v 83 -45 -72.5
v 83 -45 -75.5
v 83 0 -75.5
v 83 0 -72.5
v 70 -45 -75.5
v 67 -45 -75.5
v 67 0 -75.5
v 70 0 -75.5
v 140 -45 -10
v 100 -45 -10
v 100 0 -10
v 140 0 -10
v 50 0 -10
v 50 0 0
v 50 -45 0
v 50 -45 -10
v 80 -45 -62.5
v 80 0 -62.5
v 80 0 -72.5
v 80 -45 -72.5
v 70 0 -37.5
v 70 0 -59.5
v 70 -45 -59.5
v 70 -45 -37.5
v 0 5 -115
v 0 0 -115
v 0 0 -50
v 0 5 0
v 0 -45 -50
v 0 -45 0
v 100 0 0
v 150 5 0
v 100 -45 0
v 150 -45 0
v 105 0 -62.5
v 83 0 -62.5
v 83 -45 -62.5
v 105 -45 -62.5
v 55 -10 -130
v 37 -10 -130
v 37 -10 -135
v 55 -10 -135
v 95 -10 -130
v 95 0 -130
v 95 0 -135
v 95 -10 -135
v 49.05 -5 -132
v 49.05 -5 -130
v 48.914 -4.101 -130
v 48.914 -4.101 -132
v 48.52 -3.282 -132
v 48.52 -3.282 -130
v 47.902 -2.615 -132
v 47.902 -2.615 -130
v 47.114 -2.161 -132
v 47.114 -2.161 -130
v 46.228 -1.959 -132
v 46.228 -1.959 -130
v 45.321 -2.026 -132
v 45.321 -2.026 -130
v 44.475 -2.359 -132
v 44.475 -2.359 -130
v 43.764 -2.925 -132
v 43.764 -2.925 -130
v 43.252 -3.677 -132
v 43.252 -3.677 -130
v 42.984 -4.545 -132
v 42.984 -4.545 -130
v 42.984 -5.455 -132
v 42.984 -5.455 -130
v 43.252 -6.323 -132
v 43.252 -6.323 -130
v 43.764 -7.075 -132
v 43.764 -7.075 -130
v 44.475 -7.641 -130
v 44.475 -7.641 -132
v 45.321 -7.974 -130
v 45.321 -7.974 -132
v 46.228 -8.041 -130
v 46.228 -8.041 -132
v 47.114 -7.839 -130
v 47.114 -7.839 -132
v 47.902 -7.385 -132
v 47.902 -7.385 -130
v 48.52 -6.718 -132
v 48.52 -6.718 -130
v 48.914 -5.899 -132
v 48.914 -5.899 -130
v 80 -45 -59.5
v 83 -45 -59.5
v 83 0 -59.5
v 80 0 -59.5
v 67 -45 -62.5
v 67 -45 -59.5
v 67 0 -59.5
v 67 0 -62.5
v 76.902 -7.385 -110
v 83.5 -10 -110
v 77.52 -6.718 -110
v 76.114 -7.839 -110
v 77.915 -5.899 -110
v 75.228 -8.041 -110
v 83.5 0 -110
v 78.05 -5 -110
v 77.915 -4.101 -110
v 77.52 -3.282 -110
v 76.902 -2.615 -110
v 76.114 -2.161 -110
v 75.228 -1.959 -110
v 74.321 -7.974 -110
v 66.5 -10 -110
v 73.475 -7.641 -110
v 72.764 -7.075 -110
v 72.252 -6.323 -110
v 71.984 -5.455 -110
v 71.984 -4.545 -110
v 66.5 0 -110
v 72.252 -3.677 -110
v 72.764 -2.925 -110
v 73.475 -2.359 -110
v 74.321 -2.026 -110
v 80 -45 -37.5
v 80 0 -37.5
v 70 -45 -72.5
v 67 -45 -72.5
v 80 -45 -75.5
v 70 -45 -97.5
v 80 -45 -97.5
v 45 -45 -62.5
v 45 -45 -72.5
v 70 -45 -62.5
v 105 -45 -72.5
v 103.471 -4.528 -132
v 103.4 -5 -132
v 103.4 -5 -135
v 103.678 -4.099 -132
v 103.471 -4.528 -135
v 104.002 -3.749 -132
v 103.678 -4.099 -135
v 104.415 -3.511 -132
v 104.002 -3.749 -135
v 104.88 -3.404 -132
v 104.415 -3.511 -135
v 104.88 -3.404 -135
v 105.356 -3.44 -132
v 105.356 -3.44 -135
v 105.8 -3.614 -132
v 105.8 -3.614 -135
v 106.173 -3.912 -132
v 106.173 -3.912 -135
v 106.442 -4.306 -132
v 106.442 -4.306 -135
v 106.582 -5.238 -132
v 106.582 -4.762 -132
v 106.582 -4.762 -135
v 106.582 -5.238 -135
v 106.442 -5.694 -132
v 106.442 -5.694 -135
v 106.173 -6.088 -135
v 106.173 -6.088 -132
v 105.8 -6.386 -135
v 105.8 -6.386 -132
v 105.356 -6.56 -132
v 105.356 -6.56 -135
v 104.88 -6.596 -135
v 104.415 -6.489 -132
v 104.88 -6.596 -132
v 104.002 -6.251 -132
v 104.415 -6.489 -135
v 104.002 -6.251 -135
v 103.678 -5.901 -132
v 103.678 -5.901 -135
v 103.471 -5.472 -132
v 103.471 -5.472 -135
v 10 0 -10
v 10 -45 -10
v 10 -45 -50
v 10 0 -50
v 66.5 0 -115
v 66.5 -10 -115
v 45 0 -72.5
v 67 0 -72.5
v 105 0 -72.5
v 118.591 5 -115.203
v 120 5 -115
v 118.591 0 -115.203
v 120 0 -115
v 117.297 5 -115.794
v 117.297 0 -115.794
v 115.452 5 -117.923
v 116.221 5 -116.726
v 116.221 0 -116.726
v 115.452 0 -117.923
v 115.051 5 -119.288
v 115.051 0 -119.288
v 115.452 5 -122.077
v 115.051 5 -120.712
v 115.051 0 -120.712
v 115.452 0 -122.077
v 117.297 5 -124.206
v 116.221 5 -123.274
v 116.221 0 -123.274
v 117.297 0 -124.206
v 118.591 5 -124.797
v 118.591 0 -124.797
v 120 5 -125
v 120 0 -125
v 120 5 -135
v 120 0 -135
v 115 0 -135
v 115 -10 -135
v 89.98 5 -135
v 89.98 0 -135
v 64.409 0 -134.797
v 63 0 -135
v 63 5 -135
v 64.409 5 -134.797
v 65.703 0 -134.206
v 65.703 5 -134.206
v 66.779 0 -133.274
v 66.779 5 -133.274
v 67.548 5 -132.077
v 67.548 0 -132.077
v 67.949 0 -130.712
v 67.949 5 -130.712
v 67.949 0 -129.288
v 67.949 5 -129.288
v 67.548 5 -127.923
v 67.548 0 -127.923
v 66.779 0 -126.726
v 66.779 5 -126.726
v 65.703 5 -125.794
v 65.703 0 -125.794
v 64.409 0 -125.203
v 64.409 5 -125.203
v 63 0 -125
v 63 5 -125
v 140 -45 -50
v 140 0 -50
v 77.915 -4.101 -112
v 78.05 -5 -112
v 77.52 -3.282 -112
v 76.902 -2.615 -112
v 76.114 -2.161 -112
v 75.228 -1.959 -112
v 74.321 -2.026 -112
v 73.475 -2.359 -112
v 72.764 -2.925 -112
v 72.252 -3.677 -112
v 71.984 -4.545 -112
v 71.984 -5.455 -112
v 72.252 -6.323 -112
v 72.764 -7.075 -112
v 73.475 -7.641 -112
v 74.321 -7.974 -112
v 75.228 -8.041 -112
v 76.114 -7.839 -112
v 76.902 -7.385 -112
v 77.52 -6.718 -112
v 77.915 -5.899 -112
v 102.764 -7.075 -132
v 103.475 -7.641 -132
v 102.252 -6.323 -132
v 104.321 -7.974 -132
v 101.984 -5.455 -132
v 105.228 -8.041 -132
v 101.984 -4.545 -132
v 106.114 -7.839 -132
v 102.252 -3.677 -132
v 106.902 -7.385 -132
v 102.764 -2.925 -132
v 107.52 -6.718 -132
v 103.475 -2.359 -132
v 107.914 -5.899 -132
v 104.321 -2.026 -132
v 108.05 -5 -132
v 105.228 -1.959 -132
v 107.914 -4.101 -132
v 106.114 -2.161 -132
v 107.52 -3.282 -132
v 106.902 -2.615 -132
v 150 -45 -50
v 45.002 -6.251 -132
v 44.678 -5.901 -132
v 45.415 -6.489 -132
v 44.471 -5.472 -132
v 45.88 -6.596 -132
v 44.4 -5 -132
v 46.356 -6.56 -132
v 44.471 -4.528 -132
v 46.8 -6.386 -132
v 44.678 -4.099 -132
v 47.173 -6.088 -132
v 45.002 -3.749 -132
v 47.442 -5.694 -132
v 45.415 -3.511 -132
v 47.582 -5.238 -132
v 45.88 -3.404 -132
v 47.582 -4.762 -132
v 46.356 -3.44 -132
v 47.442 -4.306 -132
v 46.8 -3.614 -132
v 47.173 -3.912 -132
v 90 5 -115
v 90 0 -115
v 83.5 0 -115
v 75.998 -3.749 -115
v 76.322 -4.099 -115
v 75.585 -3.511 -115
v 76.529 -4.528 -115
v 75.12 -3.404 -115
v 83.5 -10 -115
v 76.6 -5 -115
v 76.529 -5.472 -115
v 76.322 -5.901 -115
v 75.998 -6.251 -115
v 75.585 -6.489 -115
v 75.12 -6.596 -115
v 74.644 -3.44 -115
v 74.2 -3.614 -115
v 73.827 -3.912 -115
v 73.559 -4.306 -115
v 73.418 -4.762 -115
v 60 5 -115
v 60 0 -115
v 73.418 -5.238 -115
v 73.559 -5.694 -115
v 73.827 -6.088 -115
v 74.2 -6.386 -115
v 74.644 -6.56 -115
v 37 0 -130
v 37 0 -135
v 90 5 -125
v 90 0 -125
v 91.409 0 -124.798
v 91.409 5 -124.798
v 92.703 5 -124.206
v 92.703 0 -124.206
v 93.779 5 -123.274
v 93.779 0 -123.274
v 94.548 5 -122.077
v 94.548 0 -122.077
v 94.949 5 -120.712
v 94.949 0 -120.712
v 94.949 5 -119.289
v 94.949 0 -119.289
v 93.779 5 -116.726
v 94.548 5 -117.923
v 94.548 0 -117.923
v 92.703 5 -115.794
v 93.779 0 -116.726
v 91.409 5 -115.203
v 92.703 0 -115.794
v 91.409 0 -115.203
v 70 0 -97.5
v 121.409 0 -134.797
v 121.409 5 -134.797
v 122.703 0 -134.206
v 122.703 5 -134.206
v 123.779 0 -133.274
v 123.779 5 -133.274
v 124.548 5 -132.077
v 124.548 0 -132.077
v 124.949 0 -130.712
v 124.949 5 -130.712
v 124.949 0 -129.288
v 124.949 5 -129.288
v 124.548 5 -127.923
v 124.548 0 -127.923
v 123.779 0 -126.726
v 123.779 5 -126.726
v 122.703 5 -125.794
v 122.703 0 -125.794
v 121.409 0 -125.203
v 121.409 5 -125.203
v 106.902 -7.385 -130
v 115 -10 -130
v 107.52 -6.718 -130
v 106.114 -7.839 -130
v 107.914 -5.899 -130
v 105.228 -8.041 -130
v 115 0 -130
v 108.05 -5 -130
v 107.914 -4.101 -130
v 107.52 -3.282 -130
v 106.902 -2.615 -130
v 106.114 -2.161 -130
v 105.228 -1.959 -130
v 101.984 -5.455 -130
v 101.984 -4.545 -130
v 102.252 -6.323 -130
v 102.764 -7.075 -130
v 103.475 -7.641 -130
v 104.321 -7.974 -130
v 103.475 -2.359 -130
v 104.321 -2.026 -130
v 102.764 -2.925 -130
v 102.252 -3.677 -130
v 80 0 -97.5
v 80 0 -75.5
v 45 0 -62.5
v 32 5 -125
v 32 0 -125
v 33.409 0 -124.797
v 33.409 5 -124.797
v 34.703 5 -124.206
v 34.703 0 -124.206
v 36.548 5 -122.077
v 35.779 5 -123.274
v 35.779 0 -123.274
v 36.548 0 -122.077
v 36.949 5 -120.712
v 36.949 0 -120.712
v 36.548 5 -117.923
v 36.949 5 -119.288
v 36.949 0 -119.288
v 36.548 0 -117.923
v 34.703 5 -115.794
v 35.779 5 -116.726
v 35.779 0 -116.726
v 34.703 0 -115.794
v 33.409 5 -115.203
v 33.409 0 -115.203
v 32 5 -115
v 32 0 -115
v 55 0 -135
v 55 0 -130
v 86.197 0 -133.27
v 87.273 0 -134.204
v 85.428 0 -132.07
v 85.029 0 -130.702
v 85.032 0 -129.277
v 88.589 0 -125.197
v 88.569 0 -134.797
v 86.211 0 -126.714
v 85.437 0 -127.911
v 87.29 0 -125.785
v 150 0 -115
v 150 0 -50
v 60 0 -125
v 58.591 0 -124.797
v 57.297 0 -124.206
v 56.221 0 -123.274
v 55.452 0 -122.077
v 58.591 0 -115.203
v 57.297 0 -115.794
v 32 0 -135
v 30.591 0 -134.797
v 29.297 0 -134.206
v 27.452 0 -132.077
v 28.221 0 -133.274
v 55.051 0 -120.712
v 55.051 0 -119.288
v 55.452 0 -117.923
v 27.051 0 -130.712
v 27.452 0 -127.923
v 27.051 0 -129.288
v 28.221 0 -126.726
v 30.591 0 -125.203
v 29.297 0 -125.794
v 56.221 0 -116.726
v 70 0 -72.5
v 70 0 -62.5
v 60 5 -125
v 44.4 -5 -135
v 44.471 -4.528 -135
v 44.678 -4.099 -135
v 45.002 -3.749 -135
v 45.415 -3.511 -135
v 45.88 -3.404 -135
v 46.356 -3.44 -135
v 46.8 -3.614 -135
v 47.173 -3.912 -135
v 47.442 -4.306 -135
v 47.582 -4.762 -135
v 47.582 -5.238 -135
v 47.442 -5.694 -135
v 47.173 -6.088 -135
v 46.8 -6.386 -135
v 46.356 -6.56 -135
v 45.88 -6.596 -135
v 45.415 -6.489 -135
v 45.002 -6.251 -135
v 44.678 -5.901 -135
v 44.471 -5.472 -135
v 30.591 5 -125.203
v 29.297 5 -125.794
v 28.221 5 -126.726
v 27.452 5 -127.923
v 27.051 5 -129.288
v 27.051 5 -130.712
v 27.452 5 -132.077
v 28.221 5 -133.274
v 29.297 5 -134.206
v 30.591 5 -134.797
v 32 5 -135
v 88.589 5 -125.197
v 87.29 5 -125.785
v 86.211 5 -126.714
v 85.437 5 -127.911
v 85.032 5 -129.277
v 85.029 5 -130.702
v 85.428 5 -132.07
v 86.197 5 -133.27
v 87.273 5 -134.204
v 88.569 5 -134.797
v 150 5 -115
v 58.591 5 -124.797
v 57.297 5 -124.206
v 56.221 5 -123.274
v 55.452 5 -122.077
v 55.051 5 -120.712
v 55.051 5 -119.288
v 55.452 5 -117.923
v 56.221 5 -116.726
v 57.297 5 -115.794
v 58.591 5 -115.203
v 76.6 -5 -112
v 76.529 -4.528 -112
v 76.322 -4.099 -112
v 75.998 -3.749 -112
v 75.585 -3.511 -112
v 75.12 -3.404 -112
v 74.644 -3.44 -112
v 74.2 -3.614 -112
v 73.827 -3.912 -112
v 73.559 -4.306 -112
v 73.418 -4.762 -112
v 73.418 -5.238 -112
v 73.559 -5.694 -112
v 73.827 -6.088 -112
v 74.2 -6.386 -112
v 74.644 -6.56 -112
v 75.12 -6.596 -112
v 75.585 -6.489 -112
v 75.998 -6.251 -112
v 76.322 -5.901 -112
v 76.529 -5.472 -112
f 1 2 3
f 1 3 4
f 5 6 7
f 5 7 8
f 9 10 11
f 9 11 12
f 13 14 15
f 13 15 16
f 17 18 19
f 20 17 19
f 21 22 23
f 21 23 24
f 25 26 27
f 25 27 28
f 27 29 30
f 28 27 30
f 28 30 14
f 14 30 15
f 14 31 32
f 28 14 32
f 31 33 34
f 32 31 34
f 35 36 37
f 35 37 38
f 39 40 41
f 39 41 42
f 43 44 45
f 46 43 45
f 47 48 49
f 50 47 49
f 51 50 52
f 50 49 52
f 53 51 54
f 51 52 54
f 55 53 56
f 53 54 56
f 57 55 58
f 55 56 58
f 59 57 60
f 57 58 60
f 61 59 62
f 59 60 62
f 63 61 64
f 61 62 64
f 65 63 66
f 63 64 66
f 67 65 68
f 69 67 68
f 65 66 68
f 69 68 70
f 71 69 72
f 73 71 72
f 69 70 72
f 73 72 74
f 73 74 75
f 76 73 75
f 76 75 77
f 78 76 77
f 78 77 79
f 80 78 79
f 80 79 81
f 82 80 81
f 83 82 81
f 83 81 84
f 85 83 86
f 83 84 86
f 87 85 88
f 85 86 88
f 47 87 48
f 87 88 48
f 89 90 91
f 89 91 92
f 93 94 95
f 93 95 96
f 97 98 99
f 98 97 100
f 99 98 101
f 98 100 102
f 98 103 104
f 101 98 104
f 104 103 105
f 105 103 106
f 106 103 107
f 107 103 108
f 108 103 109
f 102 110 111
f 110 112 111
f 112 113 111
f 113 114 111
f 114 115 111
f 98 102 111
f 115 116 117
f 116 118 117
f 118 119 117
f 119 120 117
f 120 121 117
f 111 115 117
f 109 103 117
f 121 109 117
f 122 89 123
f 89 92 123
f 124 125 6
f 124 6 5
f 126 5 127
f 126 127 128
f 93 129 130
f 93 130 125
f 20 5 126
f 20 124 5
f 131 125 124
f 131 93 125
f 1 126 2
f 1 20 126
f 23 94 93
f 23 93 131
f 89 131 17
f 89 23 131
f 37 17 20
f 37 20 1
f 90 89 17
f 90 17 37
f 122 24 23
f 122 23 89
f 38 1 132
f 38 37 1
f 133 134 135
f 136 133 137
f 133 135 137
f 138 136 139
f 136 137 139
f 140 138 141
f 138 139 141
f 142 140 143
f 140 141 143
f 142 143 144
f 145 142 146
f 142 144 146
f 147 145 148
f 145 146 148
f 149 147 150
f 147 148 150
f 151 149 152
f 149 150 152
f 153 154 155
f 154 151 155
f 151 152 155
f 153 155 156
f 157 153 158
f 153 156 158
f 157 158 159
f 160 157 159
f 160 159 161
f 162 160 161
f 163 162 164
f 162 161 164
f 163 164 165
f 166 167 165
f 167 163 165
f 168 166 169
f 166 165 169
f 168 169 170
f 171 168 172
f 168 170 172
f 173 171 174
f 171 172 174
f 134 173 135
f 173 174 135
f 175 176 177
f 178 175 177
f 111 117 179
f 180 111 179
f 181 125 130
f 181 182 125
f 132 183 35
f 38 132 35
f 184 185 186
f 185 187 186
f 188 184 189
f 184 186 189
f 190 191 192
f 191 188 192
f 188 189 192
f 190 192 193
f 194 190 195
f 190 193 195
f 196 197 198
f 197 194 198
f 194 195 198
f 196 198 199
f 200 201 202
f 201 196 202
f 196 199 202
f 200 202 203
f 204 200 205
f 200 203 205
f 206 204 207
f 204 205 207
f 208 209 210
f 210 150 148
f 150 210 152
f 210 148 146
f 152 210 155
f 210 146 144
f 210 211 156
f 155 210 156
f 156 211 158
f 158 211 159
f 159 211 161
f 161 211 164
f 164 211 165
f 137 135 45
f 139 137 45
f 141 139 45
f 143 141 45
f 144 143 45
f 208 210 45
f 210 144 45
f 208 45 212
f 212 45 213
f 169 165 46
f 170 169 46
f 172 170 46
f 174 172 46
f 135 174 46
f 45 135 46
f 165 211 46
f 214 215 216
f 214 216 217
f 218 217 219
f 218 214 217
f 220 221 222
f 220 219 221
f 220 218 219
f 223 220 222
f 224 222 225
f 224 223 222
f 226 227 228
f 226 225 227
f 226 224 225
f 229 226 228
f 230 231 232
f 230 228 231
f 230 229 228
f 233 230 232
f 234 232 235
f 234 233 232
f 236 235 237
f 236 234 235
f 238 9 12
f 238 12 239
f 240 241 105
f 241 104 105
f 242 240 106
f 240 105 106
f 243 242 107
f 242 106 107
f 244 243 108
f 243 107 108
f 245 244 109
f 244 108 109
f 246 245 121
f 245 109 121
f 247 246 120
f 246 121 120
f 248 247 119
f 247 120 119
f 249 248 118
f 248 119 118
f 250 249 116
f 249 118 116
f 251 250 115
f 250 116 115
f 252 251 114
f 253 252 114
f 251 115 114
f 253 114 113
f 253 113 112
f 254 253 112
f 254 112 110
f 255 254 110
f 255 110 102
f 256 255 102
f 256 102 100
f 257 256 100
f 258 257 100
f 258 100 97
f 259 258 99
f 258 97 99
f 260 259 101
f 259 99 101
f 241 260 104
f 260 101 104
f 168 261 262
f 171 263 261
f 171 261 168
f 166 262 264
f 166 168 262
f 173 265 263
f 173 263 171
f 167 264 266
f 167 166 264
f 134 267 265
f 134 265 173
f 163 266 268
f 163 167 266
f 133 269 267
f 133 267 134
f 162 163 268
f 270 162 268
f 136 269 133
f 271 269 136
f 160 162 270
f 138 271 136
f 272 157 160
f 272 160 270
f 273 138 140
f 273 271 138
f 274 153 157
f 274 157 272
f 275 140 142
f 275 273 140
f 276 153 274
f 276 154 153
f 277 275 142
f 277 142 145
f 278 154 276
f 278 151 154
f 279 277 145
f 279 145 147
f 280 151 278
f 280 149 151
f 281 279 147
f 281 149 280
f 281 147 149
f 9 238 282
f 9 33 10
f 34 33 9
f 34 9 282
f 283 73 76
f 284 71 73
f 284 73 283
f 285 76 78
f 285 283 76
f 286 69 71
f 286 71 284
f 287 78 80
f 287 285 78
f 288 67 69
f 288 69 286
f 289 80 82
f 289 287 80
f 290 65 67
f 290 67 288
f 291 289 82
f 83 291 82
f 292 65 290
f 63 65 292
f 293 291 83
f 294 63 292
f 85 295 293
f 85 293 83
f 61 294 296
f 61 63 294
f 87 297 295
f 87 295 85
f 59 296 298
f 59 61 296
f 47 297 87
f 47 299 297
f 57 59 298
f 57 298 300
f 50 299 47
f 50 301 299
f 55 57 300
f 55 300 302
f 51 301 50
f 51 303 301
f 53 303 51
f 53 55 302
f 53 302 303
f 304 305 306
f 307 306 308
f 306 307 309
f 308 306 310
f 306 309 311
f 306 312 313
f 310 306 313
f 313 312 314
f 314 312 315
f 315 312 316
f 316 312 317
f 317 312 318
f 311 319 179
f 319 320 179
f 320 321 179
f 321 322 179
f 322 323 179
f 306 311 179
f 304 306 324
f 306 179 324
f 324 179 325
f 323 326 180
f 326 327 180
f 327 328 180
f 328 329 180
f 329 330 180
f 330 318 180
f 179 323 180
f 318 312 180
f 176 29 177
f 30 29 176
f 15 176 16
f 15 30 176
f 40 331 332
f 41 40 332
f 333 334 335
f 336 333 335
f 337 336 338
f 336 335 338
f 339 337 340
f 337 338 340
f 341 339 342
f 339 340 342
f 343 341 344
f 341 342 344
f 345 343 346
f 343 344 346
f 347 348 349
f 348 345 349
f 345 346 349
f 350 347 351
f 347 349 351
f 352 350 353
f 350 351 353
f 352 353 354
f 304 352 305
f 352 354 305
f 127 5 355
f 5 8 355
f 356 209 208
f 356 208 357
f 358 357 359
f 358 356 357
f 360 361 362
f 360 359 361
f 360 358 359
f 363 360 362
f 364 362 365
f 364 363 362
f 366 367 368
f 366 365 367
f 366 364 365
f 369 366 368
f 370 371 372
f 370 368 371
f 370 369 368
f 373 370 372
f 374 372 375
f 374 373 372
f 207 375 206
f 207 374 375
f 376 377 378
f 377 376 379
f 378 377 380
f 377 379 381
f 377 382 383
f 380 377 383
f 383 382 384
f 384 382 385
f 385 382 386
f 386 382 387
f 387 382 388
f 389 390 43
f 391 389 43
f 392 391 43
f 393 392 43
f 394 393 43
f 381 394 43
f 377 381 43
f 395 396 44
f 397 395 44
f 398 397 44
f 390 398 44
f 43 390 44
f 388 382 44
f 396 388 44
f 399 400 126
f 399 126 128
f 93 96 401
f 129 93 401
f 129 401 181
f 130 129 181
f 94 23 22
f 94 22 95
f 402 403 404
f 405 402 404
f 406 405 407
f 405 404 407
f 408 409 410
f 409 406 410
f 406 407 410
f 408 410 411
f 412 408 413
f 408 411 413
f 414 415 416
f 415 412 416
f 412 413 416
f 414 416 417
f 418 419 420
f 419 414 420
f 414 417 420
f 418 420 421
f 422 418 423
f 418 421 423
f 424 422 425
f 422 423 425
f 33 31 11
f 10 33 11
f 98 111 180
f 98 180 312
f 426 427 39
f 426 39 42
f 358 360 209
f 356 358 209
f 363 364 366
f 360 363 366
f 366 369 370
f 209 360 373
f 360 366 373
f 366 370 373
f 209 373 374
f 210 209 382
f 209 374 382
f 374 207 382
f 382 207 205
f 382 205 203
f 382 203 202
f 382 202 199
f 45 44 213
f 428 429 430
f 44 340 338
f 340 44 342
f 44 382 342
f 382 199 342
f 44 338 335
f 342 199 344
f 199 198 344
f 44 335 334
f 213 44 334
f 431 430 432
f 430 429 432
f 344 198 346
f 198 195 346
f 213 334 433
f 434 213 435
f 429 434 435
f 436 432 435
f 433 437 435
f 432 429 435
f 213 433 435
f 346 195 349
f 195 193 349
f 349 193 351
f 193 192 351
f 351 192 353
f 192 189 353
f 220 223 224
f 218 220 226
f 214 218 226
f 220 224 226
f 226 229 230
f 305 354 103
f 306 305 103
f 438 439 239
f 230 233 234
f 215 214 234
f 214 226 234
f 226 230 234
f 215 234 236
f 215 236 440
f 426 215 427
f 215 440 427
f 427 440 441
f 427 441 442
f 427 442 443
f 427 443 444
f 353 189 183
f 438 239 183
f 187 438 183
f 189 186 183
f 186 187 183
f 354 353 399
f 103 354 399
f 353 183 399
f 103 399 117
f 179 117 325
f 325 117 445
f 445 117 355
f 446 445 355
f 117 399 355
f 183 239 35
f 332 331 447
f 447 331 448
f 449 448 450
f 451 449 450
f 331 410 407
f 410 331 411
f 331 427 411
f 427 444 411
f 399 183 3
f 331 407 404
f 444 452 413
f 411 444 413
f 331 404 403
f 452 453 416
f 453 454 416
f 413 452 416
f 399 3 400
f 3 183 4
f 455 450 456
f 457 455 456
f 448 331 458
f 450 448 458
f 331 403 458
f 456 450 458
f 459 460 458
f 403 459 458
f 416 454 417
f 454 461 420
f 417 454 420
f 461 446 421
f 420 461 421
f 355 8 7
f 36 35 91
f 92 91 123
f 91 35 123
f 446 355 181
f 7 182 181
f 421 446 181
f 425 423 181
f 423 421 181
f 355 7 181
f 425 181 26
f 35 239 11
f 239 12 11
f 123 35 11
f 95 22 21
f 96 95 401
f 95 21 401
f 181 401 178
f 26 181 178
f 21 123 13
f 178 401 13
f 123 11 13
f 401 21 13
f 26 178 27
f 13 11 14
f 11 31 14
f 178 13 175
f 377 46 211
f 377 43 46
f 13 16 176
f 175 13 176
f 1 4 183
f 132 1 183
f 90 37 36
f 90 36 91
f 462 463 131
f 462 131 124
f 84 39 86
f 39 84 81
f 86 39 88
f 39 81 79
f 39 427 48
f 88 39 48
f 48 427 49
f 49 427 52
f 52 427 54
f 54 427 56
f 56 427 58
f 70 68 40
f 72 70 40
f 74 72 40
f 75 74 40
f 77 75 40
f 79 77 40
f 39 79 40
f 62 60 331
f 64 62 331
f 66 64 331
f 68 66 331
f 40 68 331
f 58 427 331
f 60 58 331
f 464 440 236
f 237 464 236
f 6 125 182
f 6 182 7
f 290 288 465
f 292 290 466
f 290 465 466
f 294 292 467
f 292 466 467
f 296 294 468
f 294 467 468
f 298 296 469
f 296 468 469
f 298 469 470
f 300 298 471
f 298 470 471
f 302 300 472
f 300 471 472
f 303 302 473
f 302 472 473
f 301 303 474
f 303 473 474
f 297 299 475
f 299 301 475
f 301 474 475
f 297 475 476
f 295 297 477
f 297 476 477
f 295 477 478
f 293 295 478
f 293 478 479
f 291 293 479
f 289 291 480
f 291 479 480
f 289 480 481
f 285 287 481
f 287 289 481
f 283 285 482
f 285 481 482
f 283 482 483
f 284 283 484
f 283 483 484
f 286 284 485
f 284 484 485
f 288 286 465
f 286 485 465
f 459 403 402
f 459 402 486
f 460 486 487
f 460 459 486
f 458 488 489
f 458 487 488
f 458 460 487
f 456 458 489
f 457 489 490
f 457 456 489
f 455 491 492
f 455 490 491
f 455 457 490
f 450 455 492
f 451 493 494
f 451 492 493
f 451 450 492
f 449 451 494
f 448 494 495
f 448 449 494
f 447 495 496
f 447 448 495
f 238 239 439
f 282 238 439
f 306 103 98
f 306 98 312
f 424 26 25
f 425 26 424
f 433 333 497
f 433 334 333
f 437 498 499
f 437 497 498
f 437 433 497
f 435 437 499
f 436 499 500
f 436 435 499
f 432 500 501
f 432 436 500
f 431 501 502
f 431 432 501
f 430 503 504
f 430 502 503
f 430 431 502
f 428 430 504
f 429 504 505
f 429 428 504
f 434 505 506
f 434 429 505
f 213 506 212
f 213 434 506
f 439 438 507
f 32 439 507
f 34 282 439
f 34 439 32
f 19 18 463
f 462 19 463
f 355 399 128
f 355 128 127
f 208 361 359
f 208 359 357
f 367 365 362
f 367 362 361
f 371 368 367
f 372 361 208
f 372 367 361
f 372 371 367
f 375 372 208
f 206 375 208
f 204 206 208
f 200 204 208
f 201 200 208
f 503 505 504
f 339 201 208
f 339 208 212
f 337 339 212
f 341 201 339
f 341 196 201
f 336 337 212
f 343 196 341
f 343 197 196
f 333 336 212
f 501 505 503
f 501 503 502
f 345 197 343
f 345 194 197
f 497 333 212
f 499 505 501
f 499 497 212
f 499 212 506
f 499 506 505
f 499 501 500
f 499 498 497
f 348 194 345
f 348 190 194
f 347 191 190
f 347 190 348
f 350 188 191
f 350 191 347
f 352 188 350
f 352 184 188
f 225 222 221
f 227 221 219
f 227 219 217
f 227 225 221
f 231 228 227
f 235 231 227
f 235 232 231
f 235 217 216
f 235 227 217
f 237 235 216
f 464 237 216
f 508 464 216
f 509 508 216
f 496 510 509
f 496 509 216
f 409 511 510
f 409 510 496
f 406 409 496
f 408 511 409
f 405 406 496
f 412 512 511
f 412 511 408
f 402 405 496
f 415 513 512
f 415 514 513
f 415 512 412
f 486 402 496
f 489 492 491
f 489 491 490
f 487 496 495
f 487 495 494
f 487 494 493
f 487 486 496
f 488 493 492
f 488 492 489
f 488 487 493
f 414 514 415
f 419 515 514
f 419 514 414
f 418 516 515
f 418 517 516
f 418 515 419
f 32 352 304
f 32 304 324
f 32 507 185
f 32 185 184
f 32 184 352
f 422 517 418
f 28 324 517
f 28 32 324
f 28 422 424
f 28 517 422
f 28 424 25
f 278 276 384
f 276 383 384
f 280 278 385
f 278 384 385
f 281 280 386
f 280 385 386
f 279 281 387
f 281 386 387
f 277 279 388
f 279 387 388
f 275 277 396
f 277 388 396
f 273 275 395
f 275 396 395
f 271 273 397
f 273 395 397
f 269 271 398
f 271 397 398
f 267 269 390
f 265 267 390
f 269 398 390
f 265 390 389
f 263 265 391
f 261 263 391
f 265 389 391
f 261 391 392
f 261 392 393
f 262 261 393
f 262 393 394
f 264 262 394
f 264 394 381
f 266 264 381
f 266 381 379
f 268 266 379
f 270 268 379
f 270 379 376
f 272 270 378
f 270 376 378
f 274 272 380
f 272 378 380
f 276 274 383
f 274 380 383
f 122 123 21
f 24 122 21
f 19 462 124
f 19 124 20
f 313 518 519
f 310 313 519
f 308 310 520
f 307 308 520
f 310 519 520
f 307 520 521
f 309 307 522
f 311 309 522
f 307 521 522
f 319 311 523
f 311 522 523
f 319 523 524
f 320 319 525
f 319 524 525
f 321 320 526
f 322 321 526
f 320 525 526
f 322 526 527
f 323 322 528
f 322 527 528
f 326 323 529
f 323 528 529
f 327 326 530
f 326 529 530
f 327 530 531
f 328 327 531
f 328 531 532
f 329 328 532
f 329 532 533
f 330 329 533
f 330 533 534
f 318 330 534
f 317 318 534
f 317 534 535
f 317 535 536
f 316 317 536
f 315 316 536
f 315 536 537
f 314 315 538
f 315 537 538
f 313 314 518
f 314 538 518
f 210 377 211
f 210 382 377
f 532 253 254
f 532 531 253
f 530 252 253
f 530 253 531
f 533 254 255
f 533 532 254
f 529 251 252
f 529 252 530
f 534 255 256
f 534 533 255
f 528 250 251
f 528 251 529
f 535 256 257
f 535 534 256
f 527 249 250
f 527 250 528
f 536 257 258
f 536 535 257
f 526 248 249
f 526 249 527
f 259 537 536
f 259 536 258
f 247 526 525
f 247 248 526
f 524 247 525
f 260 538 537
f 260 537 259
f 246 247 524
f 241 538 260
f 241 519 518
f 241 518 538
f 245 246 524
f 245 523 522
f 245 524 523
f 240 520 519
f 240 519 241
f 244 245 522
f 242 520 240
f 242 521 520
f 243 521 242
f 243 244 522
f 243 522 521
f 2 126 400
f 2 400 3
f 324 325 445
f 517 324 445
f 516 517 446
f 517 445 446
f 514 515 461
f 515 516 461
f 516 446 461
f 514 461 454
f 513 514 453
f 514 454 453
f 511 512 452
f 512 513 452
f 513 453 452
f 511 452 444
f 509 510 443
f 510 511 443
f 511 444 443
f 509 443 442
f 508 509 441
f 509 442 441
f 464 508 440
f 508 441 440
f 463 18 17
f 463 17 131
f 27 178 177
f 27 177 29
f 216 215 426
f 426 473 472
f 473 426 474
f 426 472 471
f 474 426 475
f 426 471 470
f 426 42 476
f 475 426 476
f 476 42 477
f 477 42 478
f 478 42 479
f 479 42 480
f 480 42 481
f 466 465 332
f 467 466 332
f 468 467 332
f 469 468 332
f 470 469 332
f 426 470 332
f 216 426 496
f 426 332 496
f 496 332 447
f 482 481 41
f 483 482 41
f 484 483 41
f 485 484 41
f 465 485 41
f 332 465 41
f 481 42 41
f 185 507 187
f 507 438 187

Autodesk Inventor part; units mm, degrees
ref_plane "YZ Plane" through (0, 0, 0) normal (1, 0, 0) x (0, 1, 0)
ref_plane "XZ Plane" through (0, 0, 0) normal (0, 1, 0) x (-1, 0, 0)
ref_plane "XY Plane" through (0, 0, 0) normal (0, 0, 1) x (1, 0, 0)
sketch "puzzle" plane through (0, 0, 0) normal (0, 1, 0) x (-1, 0, 0)
  line L0 (0, 0) -> (-150, 0)
  line L1 (0, -115) -> (-15, -115)
  line L2 (-135, -115) -> (-125, -115)
  line L3 (-135, -115) -> (-150, -115)
  line L4 (-75, -115) -> (-65, -115)
  line L5 (-75, -115) -> (-85.0002, -115)
  line L6 (-105, -135) -> (-94.9796, -135)
  line L7 (-94.9796, -135) -> (-115, -135)
  line L8 (-65, -115) -> (-60, -115)
  line L9 (-60, -125) -> (-63, -125)
  arc A0 (-60, -125) -> (-60, -115) centre (-60, -120) ccw
  arc A1 (-63, -125) -> (-63, -135) centre (-63, -130) ccw
  line L10 (-85.0002, -115) -> (-90.0002, -115)
  line L11 (-94.9796, -135) -> (-89.9796, -135)
  arc A2 (-90.0002, -115) -> (-90, -125) centre (-90.0002, -120) ccw
  arc A3 (-89.9796, -135) -> (-90, -125) centre (-89.9796, -130) ccw
  line L12 (-115, -135) -> (-120, -135)
  line L13 (-125, -115) -> (-120, -115)
  arc A4 (-120, -125) -> (-120, -115) centre (-120, -120) ccw
  arc A5 (-120, -125) -> (-120, -135) centre (-120, -130) ccw
  line L14 (0, -115) -> (-30, -115)
  line L15 (-63, -135) -> (-32.98, -135)
  line L16 (-32.98, -135) -> (-32, -135)
  line L17 (-30, -115) -> (-32, -115)
  arc A6 (-32, -115) -> (-32, -125) centre (-32, -120) ccw
  arc A7 (-32, -135) -> (-32, -125) centre (-32, -130) ccw
  line L18 (-150, -115) -> (-150, 0)
  line L19 (0, -115) -> (0, 0)
  dimension "d22" = 5
  dimension "d23" = 5
  dimension "d24" = 5
  dimension "d25" = 5
  dimension "d26" = 5
extrude "Extrusión1" add sketch "puzzle" along normal blind 5
sketch "peus" plane through (0, 0, 0) normal (0, -1, 0) x (1, 0, 0)
  line L0 (150, 0) -> (145, 0)
  line L1 (150, 0) -> (100, 0)
  line L2 (0, -115) -> (0, 0) projected
  line L3 (0, 0) -> (50, 0)
  line L4 (50, 0) -> (50, -10)
  line L5 (0, 0) -> (10, 0)
  line L6 (10, -50) -> (0, -50)
  line L7 (0, -50) -> (0, 0)
  line L8 (50, -10) -> (10, -10)
  line L9 (10, -10) -> (10, -50)
  line L10 (100, 0) -> (100, -10)
  line L11 (100, -10) -> (140, -10)
  line L12 (140, -10) -> (140, -50)
  line L13 (140, -50) -> (150, -50)
  line L14 (150, 0) -> (150, -115) projected
  line L15 (150, 0) -> (150, -50)
  line L16 (0, 0) -> (150, 0) projected
  line L17 (45, -62.5) -> (45, -72.5)
  line L18 (105, -72.5) -> (105, -62.5)
  line L19 (80, -97.5) -> (70, -97.5)
  line L20 (80, -37.5) -> (70, -37.5)
  line L21 (80, -62.5) -> (70, -62.5)
  line L22 (70, -62.5) -> (70, -72.5)
  line L23 (70, -72.5) -> (80, -72.5)
  line L24 (80, -62.5) -> (80, -72.5)
  line L25 (83, -62.5) -> (83, -59.5)
  line L26 (83, -59.5) -> (80, -59.5)
  line L27 (70, -59.5) -> (67, -59.5)
  line L28 (67, -59.5) -> (67, -62.5)
  line L29 (67, -72.5) -> (67, -75.5)
  line L30 (67, -75.5) -> (70, -75.5)
  line L31 (80, -75.5) -> (83, -75.5)
  line L32 (83, -75.5) -> (83, -72.5)
  line L33 (83, -72.5) -> (105, -72.5)
  line L34 (83, -62.5) -> (105, -62.5)
  line L35 (80, -59.5) -> (80, -37.5)
  line L36 (70, -59.5) -> (70, -37.5)
  line L37 (67, -62.5) -> (45, -62.5)
  line L38 (67, -72.5) -> (45, -72.5)
  line L39 (70, -75.5) -> (70, -97.5)
  line L40 (80, -75.5) -> (80, -97.5)
  line L41 (83, -72.5) -> (105, -72.5)
  dimension "d70" = 3
extrude "Extrusión3" add sketch "peus" along normal blind 45
sketch "Boceto4" plane through (0, 0, 0) normal (0, -1, 0) x (1, 0, 0)
  line L0 (55, -135) -> (37, -135)
  line L1 (120, -135) -> (89.9796, -135) projected
  line L2 (115, -135) -> (95, -135)
  line L3 (90.0002, -115) -> (60, -115) projected
  line L4 (75.0001, -115) -> (83.5001, -115)
  line L5 (83.5001, -115) -> (66.5001, -115)
  line L6 (83.5001, -110) -> (66.5001, -110)
  line L7 (83.5001, -110) -> (83.5001, -115)
  line L8 (66.5001, -110) -> (66.5001, -115)
  line L9 (55, -130) -> (37, -130)
  line L10 (55, -130) -> (55, -135)
  line L11 (37, -130) -> (37, -135)
  line L12 (115, -130) -> (95, -130)
  line L13 (95, -130) -> (95, -135)
  line L14 (115, -130) -> (115, -135)
  point P0 (0, 0)
extrude "Extrusión4" add sketch "Boceto4" along normal blind 10
sketch "Boceto5" plane through (55, 0, -135) normal (0, 0, -1) x (-1, 0, 0)
  circle A0 centre (9, -5) radius 1.6
  circle A1 centre (-50, -5) radius 1.6
  point P0 (55, 0)
  dimension "d81" = 3.2
  dimension "d82" = 3.2
extrude "Extrusión5" cut sketch "Boceto5" against normal blind 14.25
sketch "Boceto6" plane through (95, 0, -130) normal (0, 0, 1) x (1, 0, 0)
  circle A0 centre (-49, -5) radius 1.6 projected
  circle A1 centre (-49, -5) radius 3.05
  circle A2 centre (10, -5) radius 1.6 projected
  circle A3 centre (10, -5) radius 3.05
  point P0 (-95, 0)
  dimension "d85" = 6.1
  dimension "d86" = 6.1
extrude "Extrusión6" cut sketch "Boceto6" against normal blind 2
sketch "Boceto7" plane through (66.5001, 0, -110) normal (0, 0, 1) x (1, 0, 0)
  line L0 (17, -10) -> (0, -10) projected
  line L1 (8.5, -10) -> (8.5, 0)
  line L2 (0, 0) -> (17, 0) projected
  circle A0 centre (8.5, -5) radius 3.05
  point P0 (-66.5001, 0)
  dimension "d89" = 6.1
extrude "Extrusión7" cut sketch "Boceto7" against normal blind 2
sketch "Boceto8" plane through (66.5001, 0, -110) normal (0, 0, 1) x (1, 0, 0)
  circle A0 centre (8.5, -5) radius 3.05 projected
  circle A1 centre (8.5, -5) radius 1.6
  point P0 (-66.5001, 0)
  dimension "d92" = 3.2
extrude "Extrusión8" cut sketch "Boceto8" against normal blind 13 contours A1
properties part number "base auxiliar 1"
